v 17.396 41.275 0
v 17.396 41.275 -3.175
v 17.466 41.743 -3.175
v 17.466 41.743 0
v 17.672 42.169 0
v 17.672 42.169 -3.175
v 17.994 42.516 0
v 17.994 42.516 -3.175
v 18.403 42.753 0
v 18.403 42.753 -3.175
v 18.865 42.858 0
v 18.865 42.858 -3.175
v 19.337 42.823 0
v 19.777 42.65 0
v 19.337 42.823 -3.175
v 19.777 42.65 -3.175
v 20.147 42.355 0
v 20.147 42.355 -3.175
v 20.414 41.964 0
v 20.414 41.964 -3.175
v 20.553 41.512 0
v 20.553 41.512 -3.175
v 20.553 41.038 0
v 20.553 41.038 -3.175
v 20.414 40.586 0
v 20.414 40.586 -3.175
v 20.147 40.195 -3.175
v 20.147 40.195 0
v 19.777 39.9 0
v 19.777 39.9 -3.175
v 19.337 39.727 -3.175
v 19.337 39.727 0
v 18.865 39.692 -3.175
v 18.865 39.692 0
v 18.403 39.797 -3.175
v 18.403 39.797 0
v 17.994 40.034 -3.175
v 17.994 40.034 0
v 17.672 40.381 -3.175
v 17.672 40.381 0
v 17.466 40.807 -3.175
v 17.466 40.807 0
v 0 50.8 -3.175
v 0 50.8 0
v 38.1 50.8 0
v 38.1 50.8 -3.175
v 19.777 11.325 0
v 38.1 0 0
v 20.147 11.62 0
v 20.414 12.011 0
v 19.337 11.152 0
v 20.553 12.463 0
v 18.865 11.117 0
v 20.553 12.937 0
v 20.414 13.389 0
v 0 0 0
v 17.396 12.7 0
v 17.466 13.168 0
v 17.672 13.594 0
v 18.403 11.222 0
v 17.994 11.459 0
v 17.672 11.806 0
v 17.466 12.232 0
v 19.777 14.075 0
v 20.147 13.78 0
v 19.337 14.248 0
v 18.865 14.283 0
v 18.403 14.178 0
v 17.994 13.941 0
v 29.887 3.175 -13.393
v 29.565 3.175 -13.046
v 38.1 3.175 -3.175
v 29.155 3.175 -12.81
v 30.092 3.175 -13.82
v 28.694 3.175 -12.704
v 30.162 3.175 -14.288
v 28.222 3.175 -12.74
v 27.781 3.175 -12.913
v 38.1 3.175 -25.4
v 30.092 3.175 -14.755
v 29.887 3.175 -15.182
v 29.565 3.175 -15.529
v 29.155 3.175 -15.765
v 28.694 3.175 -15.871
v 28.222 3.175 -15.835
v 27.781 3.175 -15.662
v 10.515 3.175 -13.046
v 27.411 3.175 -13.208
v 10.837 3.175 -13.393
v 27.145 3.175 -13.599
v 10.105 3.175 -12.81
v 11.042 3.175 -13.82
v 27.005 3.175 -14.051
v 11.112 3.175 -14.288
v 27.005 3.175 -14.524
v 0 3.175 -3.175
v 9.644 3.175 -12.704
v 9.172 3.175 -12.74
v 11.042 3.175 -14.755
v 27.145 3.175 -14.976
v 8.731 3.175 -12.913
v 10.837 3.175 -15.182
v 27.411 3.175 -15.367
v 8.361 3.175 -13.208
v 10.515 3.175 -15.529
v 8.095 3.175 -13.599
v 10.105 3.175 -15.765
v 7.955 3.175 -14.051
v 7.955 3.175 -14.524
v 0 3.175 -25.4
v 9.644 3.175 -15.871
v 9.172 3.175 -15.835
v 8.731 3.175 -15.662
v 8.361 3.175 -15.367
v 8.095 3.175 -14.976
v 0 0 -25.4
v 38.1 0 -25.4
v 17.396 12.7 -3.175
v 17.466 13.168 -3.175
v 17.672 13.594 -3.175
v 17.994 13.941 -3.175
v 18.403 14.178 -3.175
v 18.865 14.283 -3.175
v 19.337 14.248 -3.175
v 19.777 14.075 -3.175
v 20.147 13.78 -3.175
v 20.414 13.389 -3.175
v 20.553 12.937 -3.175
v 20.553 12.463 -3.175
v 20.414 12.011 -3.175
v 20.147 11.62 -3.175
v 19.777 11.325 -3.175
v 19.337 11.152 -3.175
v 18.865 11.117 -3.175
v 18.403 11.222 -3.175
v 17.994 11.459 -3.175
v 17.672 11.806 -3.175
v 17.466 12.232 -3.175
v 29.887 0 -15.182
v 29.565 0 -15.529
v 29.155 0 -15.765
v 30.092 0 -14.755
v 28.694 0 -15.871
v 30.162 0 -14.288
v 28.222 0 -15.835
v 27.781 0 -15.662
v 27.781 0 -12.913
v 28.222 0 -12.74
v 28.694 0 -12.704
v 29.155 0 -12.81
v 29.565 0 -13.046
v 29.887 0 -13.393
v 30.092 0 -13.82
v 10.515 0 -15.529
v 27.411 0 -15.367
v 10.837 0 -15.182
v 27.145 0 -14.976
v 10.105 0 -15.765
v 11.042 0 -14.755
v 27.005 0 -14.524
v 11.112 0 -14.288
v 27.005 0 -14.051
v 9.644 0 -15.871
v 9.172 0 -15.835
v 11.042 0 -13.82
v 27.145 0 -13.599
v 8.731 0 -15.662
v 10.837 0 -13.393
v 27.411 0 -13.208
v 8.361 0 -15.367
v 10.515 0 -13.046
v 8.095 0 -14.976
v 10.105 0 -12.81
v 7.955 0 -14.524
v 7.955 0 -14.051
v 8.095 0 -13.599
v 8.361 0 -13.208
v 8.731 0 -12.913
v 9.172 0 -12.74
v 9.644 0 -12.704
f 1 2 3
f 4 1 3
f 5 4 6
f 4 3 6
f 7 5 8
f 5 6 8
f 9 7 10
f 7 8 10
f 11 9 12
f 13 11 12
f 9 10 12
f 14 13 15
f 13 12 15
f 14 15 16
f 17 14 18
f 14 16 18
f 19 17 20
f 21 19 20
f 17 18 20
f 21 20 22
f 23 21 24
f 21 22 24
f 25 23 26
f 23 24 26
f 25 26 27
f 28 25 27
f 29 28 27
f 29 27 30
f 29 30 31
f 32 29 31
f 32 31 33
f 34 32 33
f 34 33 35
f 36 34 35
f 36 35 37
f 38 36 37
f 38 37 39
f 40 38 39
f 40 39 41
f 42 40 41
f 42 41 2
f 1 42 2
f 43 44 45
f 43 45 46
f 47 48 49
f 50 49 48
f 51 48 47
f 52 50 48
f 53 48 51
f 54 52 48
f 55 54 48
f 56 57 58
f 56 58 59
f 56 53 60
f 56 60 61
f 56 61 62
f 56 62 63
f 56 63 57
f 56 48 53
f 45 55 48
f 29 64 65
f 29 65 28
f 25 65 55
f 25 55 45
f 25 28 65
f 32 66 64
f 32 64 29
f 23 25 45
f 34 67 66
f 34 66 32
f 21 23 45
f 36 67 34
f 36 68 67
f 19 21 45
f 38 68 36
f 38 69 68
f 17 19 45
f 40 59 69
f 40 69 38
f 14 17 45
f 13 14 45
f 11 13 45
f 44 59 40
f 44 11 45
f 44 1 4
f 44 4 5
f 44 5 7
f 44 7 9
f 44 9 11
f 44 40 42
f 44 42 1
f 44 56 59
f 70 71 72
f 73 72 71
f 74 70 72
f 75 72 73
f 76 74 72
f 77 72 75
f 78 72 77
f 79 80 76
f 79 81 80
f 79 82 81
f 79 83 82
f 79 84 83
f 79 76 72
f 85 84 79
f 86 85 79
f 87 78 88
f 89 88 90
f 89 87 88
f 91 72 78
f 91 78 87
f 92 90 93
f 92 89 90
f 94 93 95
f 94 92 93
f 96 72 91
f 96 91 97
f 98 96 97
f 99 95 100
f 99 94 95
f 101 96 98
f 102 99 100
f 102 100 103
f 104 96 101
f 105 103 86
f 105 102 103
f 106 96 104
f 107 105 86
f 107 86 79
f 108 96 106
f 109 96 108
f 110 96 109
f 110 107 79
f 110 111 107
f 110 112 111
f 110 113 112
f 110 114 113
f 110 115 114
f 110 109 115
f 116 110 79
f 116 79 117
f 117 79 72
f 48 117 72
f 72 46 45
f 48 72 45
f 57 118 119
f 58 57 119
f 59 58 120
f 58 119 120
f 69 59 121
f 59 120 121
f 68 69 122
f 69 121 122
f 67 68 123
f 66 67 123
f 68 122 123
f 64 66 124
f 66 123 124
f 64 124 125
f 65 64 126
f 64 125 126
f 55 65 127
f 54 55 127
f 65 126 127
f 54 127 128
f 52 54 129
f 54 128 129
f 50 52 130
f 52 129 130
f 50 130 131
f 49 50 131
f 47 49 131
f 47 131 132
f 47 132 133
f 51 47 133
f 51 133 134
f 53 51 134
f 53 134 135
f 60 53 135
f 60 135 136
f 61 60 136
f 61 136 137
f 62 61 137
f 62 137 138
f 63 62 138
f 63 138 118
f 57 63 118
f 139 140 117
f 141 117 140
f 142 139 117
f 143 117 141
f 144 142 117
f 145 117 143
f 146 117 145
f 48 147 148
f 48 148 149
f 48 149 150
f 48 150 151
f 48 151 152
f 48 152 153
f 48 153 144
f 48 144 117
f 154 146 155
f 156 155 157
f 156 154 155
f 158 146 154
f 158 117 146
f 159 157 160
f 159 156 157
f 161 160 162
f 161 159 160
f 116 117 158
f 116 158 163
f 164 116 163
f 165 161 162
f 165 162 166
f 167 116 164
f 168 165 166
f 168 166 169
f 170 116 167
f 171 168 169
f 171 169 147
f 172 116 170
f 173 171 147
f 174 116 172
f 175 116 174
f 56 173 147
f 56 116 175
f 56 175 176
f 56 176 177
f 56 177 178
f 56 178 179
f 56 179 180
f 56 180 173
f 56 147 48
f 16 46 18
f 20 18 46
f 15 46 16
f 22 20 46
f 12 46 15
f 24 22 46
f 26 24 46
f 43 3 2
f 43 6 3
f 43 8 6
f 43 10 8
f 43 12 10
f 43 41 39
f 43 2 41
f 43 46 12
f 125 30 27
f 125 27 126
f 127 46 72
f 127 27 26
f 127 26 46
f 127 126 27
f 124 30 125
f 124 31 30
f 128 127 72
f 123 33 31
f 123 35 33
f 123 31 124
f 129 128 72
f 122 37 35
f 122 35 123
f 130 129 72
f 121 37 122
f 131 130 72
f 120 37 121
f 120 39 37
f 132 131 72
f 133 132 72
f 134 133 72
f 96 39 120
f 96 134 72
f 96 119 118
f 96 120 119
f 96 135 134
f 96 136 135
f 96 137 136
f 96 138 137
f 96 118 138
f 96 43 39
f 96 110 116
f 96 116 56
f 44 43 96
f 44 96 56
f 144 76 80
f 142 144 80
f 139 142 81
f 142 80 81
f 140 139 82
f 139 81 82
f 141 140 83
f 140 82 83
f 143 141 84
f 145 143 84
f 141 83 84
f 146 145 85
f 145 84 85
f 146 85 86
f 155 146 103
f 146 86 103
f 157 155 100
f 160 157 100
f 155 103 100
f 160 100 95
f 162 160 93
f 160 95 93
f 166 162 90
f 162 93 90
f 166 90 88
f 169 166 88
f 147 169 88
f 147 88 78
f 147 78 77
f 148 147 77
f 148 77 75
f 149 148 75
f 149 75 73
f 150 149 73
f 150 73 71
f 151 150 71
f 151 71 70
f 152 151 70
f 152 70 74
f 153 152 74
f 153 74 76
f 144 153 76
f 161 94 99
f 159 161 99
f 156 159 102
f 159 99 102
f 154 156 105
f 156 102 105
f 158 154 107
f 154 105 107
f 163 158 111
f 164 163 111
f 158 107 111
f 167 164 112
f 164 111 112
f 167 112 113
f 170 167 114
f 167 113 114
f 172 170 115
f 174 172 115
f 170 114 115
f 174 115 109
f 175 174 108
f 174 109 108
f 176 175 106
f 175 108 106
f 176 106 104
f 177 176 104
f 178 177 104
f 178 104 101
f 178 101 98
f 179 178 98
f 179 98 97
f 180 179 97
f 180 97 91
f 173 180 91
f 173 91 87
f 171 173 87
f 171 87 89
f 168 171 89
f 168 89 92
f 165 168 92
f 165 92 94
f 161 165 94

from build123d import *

# Parameters (mm, degrees)
BOSS_EXTRUDE1_DEPTH = 38.1
CUT_EXTRUDE1_REACH  = 5.175
SKETCH2_R           = 1.5875
CUT_EXTRUDE2_REACH  = 5.175
SKETCH3_R           = 1.5875


with BuildPart() as part:
    # Sketch1 → Boss-Extrude1 (new body)
    with BuildSketch(Plane(origin=(0, 0, 0), x_dir=(0, 0, -1), z_dir=(1, 0, 0))):
        Polygon((0, 0), (0, 50.8), (3.175, 50.8), (3.175, 3.175), (25.4, 3.175), (25.4, 0), align=None)
    extrude(amount=BOSS_EXTRUDE1_DEPTH)

    # Sketch2 → Cut-Extrude1 (cut, up to next)
    with BuildSketch(Plane(origin=(0, 3.175, 0), x_dir=(1, 0, 0), z_dir=(0, 1, 0)), mode=Mode.PRIVATE) as cut_extrude1_sk1:
        with Locations((28.575, 14.2875)):
            Circle(SKETCH2_R)
    cut_extrude1_tool1 = extrude(cut_extrude1_sk1.sketch, amount=-CUT_EXTRUDE1_REACH, mode=Mode.PRIVATE) & part.part
    add(cut_extrude1_tool1.solids().sort_by_distance((28.575, 3.175, -14.2875))[0], mode=Mode.SUBTRACT)
    # Sketch2 → Cut-Extrude1 (cut, up to next)
    with BuildSketch(Plane(origin=(0, 3.175, 0), x_dir=(1, 0, 0), z_dir=(0, 1, 0)), mode=Mode.PRIVATE) as cut_extrude1_sk2:
        with Locations((9.525, 14.2875)):
            Circle(SKETCH2_R)
    cut_extrude1_tool2 = extrude(cut_extrude1_sk2.sketch, amount=-CUT_EXTRUDE1_REACH, mode=Mode.PRIVATE) & part.part
    add(cut_extrude1_tool2.solids().sort_by_distance((9.525, 3.175, -14.2875))[0], mode=Mode.SUBTRACT)

    # Sketch3 → Cut-Extrude2 (cut, up to next)
    with BuildSketch(Plane(origin=(0, 0, -3.175), x_dir=(-1, 0, 0), z_dir=(0, 0, -1)), mode=Mode.PRIVATE) as cut_extrude2_sk1:
        with Locations((-18.983298196, 12.7)):
            Circle(SKETCH3_R)
    cut_extrude2_tool1 = extrude(cut_extrude2_sk1.sketch, amount=-CUT_EXTRUDE2_REACH, mode=Mode.PRIVATE) & part.part
    add(cut_extrude2_tool1.solids().sort_by_distance((18.983298, 12.7, -3.175))[0], mode=Mode.SUBTRACT)
    # Sketch3 → Cut-Extrude2 (cut, up to next)
    with BuildSketch(Plane(origin=(0, 0, -3.175), x_dir=(-1, 0, 0), z_dir=(0, 0, -1)), mode=Mode.PRIVATE) as cut_extrude2_sk2:
        with Locations((-18.983298196, 41.275)):
            Circle(SKETCH3_R)
    cut_extrude2_tool2 = extrude(cut_extrude2_sk2.sketch, amount=-CUT_EXTRUDE2_REACH, mode=Mode.PRIVATE) & part.part
    add(cut_extrude2_tool2.solids().sort_by_distance((18.983298, 41.275, -3.175))[0], mode=Mode.SUBTRACT)


solid = part.part
